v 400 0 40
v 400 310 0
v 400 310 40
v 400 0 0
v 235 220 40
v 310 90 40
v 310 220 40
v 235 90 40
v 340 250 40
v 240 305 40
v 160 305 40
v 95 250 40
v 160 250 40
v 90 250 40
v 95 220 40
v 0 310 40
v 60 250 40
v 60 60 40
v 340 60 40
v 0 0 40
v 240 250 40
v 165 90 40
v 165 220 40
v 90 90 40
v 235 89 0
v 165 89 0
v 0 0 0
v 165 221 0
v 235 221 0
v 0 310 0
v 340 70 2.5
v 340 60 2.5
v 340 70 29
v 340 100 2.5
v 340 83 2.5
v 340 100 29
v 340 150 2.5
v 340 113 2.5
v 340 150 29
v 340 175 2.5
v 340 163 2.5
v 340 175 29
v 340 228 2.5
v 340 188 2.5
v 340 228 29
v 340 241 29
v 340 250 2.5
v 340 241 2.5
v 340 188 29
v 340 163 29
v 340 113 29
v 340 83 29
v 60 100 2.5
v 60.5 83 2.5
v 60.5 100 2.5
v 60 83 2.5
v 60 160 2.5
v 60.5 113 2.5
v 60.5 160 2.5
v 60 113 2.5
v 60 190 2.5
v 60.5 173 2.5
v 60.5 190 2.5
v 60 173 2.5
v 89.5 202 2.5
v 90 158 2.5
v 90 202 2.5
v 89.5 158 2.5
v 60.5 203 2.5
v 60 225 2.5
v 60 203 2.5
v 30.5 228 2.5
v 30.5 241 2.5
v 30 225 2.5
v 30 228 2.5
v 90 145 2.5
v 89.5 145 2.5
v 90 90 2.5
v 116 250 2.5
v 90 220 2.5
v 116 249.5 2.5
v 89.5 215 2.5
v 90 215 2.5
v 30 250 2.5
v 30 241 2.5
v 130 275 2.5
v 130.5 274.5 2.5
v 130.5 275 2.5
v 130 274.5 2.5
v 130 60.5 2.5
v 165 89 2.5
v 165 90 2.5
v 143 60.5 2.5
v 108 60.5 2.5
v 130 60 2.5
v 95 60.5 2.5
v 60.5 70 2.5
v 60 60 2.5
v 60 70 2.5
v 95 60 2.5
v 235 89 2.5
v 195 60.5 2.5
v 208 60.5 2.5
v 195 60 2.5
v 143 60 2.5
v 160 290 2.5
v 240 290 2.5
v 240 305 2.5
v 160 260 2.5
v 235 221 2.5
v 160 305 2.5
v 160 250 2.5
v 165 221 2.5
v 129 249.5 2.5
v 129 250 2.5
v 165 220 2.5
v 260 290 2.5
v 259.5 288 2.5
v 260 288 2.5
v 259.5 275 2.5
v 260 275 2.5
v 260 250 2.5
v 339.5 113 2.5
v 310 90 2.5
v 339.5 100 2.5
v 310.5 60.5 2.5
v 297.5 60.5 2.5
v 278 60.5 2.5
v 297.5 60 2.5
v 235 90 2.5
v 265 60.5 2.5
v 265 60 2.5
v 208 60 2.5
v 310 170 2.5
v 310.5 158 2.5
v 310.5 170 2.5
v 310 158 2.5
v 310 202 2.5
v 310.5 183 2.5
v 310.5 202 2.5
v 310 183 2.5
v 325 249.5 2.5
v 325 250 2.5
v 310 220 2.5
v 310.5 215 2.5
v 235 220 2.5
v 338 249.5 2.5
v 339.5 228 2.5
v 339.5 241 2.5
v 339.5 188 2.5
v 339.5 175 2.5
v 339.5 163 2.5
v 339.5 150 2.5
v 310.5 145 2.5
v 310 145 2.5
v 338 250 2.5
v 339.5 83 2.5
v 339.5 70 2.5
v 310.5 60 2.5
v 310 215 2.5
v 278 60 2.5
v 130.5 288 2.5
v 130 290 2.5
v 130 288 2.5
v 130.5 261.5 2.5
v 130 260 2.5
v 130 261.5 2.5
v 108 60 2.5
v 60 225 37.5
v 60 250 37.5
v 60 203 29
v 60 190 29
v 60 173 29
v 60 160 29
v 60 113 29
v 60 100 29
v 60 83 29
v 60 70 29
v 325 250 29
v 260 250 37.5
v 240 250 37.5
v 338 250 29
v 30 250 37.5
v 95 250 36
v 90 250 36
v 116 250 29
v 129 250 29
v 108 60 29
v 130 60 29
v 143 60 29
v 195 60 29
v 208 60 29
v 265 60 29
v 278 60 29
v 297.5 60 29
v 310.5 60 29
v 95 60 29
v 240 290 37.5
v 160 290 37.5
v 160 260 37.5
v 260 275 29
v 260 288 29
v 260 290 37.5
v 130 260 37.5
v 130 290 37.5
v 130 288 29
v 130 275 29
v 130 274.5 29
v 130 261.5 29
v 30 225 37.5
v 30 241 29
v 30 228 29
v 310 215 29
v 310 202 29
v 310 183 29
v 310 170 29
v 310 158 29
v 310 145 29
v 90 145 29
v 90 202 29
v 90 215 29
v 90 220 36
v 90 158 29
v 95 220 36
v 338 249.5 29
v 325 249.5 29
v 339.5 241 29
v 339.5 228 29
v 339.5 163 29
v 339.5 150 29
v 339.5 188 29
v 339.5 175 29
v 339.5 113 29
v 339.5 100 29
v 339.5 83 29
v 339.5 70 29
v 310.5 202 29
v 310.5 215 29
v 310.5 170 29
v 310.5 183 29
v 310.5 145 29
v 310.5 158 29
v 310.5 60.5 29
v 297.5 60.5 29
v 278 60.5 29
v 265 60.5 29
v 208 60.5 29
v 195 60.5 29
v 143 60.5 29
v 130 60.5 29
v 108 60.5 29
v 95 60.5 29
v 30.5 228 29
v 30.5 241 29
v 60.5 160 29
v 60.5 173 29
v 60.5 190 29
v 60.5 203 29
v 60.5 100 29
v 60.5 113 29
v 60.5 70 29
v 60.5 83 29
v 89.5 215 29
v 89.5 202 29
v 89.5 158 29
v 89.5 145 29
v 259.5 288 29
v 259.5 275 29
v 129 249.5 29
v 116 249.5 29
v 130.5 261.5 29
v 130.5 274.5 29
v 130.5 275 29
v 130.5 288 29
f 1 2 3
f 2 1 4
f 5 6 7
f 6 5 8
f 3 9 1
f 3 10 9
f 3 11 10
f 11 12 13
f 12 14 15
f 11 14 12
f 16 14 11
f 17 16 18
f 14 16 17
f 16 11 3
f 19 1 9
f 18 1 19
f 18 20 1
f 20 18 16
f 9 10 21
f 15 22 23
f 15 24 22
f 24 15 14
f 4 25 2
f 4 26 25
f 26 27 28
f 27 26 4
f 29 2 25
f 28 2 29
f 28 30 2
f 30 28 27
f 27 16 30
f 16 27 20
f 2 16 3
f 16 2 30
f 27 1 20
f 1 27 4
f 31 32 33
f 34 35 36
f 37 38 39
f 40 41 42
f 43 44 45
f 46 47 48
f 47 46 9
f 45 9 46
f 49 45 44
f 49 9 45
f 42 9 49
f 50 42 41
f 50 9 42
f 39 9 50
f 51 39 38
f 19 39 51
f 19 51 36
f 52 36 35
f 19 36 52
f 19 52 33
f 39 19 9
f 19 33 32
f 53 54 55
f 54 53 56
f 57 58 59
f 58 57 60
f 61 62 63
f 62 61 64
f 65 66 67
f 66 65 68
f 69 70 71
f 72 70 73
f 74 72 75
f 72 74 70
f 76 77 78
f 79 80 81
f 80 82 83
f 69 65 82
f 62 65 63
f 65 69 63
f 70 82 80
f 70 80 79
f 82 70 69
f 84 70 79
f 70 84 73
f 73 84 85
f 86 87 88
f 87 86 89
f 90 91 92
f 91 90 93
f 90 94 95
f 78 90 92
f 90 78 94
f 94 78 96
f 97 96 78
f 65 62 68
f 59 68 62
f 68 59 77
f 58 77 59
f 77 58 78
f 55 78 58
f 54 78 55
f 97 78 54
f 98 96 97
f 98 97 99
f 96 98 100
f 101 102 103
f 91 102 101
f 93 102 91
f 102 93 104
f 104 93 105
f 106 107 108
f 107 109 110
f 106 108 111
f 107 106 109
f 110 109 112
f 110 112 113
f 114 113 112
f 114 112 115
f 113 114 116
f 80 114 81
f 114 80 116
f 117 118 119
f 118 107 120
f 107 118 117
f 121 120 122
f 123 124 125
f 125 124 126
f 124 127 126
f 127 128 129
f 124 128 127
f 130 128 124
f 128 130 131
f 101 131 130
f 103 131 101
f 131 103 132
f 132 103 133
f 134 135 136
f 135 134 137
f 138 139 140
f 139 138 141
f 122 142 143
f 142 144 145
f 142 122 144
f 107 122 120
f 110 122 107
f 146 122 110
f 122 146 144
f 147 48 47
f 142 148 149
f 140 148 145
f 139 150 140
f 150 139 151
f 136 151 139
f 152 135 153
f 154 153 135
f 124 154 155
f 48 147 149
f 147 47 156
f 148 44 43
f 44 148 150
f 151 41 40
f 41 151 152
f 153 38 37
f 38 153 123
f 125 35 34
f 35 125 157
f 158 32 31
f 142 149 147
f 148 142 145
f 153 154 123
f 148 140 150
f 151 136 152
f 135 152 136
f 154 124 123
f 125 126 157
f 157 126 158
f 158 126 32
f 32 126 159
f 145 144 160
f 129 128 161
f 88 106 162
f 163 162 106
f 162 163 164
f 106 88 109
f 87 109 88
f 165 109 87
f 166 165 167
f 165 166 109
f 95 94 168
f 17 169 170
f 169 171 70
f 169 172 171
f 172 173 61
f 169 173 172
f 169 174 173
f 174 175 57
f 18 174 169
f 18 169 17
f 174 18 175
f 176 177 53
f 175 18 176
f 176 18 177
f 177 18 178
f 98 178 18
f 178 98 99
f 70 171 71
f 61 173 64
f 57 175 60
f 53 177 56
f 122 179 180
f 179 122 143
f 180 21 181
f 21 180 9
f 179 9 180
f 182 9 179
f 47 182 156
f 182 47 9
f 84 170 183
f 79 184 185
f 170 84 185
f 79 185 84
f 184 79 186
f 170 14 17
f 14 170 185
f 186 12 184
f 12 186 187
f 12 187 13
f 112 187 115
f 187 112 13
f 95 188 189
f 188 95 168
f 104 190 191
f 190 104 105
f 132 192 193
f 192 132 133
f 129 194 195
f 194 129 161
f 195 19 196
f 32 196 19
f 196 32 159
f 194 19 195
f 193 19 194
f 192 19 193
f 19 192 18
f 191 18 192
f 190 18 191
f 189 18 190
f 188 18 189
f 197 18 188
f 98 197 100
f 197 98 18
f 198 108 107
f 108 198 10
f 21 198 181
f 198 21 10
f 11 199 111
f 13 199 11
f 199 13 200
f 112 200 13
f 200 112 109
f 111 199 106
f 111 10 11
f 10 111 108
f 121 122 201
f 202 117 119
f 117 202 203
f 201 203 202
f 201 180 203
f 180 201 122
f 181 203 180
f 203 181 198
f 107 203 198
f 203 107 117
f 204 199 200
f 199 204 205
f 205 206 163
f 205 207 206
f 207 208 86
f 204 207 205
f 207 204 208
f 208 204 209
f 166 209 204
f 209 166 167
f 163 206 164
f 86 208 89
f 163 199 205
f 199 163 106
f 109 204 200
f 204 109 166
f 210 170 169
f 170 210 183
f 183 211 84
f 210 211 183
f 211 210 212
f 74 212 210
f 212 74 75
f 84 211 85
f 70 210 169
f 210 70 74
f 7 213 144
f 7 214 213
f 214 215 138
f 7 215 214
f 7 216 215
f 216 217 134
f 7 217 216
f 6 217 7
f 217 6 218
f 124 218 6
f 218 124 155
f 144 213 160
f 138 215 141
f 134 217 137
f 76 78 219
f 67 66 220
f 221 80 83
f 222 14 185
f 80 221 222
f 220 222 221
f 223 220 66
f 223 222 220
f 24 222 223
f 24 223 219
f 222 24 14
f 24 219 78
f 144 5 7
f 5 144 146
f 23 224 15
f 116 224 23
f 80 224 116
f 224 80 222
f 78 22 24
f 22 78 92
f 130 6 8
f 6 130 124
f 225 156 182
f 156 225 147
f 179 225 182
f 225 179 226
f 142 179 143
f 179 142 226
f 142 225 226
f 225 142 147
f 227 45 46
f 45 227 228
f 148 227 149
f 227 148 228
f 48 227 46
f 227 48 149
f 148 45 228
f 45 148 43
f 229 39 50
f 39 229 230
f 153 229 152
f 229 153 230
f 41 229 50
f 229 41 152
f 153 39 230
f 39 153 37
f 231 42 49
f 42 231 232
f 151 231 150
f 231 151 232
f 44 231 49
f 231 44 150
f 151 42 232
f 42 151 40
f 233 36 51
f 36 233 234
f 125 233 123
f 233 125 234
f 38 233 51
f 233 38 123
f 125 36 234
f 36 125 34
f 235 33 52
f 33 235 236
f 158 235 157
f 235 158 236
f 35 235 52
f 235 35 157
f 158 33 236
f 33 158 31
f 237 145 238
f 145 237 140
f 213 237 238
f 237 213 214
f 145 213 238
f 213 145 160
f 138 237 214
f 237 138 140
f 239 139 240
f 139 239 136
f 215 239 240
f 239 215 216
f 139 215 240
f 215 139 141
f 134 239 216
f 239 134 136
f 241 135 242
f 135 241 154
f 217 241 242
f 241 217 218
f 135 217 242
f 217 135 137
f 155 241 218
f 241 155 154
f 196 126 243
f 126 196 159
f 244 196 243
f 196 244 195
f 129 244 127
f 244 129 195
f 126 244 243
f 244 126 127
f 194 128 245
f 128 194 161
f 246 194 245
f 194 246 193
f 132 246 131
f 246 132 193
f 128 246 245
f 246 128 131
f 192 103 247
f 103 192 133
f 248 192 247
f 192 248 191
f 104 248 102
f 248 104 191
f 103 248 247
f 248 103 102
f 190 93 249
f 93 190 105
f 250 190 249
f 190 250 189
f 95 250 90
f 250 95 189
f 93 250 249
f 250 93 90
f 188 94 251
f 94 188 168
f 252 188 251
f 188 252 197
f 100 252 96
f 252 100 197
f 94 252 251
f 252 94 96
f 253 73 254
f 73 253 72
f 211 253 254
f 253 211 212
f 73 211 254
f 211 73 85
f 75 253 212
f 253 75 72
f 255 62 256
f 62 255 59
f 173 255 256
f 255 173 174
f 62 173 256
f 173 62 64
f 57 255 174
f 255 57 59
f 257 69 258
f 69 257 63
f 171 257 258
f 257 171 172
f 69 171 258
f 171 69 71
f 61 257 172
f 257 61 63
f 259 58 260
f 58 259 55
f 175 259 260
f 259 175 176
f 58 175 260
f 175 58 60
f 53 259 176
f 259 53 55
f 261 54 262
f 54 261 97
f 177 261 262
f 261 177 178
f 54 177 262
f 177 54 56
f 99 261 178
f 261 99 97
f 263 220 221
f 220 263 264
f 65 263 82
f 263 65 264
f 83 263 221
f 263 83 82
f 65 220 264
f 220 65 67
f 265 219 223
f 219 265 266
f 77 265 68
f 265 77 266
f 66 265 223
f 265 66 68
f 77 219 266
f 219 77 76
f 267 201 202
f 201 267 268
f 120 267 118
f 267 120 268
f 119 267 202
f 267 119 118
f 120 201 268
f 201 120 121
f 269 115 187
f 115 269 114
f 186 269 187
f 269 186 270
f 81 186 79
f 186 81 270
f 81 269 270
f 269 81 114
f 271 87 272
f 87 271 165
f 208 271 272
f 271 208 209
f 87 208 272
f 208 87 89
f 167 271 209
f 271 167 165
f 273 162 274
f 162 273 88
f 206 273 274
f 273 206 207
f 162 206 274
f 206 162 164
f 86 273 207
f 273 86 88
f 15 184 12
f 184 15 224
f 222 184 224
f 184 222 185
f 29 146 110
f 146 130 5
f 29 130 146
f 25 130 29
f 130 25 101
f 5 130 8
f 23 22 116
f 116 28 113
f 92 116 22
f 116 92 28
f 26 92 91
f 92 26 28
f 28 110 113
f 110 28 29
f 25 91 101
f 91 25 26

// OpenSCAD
module un(){
    difference(){
        cube([400,310,40]);
        translate([60,60,2.5])cube([400-120,310-120,40]);
        translate([60+100,60+55,2.5])cube([80,310-120,40]);
        translate([60+100+60,240,2.5])cube([40,50,35]);
        translate([60+100-30,260,2.5])cube([40,30,35]);
        translate([60-30,225,2.5])cube([40,25,35]);
    }

    translate([60+30,60+30,0])cube([400-120-60,310-120-60,40]);
    
    translate([325,249.5,0])cube([13,13,29]);
    translate([339.5,228,0])cube([13,13,29]);
    translate([339.5,150,0])cube([13,13,29]);
    translate([339.5,175,0])cube([13,13,29]);
    translate([339.5,100,0])cube([13,13,29]);
    translate([339.5,70,0])cube([13,13,29]);
    
    translate([297.5,202,0])cube([13,13,29]);   
    translate([297.5,170,0])cube([13,13,29]);
    translate([297.5,145,0])cube([13,13,29]);
    
    translate([297.5,47.5,0])cube([13,13,29]);
    translate([265,47.5,0])cube([13,13,29]);
    translate([195,47.5,0])cube([13,13,29]);
    translate([130,47.5,0])cube([13,13,29]);
    translate([95,47.5,0])cube([13,13,29]);
    
    translate([17.5,228,0])cube([13,13,29]);
    translate([47.5,160,0])cube([13,13,29]);
    translate([47.5,190,0])cube([13,13,29]);
    translate([47.5,100,0])cube([13,13,29]);
    translate([47.5,70,0])cube([13,13,29]);
    
    translate([89.5,202,0])cube([13,13,29]);   
    //translate([89.5,170,0])cube([13,13,29]);
    translate([89.5,145,0])cube([13,13,29]);
    
    translate([259.5,275,0])cube([13,13,29]);
    
    translate([116,249.5,0])cube([13,13,29]);
    
    translate([117.5,261.5,0])cube([13,13,29]);
    translate([117.5,275,0])cube([13,13,29]);
    
    
    translate([90,200,36])cube([5,60,4]);
    
    
}



module deux(){
    translate([0,0,40])difference(){
        cube([400,310,40]);
        translate([60,60,2])cube([400-120,310-120,45]);
        translate([60+100,60+55+134,-2])cube([80,310-120-135,45]);
        
    }

    translate([60+30,60+30,40])cube([400-120-60,310-120-60,45]);
    

}

module trois(){
    difference(){

           un();

       translate([200-35,155-50-16,-5])cube([70,132,120]); 
    }
    
}

module quatre(){
    difference(){
           deux();
       translate([200-35,155-50,-5])cube([70,116,120]); 
    }
}

module cinq(){
    translate([200-35,155-50-16+4,-5])cube([70,1,44]);
    translate([200-35,155+50,-5])cube([70,1,90]);
}


trois();
//quatre();
//cinq();
//translate([0,0,80])cube([400,310,2]);
